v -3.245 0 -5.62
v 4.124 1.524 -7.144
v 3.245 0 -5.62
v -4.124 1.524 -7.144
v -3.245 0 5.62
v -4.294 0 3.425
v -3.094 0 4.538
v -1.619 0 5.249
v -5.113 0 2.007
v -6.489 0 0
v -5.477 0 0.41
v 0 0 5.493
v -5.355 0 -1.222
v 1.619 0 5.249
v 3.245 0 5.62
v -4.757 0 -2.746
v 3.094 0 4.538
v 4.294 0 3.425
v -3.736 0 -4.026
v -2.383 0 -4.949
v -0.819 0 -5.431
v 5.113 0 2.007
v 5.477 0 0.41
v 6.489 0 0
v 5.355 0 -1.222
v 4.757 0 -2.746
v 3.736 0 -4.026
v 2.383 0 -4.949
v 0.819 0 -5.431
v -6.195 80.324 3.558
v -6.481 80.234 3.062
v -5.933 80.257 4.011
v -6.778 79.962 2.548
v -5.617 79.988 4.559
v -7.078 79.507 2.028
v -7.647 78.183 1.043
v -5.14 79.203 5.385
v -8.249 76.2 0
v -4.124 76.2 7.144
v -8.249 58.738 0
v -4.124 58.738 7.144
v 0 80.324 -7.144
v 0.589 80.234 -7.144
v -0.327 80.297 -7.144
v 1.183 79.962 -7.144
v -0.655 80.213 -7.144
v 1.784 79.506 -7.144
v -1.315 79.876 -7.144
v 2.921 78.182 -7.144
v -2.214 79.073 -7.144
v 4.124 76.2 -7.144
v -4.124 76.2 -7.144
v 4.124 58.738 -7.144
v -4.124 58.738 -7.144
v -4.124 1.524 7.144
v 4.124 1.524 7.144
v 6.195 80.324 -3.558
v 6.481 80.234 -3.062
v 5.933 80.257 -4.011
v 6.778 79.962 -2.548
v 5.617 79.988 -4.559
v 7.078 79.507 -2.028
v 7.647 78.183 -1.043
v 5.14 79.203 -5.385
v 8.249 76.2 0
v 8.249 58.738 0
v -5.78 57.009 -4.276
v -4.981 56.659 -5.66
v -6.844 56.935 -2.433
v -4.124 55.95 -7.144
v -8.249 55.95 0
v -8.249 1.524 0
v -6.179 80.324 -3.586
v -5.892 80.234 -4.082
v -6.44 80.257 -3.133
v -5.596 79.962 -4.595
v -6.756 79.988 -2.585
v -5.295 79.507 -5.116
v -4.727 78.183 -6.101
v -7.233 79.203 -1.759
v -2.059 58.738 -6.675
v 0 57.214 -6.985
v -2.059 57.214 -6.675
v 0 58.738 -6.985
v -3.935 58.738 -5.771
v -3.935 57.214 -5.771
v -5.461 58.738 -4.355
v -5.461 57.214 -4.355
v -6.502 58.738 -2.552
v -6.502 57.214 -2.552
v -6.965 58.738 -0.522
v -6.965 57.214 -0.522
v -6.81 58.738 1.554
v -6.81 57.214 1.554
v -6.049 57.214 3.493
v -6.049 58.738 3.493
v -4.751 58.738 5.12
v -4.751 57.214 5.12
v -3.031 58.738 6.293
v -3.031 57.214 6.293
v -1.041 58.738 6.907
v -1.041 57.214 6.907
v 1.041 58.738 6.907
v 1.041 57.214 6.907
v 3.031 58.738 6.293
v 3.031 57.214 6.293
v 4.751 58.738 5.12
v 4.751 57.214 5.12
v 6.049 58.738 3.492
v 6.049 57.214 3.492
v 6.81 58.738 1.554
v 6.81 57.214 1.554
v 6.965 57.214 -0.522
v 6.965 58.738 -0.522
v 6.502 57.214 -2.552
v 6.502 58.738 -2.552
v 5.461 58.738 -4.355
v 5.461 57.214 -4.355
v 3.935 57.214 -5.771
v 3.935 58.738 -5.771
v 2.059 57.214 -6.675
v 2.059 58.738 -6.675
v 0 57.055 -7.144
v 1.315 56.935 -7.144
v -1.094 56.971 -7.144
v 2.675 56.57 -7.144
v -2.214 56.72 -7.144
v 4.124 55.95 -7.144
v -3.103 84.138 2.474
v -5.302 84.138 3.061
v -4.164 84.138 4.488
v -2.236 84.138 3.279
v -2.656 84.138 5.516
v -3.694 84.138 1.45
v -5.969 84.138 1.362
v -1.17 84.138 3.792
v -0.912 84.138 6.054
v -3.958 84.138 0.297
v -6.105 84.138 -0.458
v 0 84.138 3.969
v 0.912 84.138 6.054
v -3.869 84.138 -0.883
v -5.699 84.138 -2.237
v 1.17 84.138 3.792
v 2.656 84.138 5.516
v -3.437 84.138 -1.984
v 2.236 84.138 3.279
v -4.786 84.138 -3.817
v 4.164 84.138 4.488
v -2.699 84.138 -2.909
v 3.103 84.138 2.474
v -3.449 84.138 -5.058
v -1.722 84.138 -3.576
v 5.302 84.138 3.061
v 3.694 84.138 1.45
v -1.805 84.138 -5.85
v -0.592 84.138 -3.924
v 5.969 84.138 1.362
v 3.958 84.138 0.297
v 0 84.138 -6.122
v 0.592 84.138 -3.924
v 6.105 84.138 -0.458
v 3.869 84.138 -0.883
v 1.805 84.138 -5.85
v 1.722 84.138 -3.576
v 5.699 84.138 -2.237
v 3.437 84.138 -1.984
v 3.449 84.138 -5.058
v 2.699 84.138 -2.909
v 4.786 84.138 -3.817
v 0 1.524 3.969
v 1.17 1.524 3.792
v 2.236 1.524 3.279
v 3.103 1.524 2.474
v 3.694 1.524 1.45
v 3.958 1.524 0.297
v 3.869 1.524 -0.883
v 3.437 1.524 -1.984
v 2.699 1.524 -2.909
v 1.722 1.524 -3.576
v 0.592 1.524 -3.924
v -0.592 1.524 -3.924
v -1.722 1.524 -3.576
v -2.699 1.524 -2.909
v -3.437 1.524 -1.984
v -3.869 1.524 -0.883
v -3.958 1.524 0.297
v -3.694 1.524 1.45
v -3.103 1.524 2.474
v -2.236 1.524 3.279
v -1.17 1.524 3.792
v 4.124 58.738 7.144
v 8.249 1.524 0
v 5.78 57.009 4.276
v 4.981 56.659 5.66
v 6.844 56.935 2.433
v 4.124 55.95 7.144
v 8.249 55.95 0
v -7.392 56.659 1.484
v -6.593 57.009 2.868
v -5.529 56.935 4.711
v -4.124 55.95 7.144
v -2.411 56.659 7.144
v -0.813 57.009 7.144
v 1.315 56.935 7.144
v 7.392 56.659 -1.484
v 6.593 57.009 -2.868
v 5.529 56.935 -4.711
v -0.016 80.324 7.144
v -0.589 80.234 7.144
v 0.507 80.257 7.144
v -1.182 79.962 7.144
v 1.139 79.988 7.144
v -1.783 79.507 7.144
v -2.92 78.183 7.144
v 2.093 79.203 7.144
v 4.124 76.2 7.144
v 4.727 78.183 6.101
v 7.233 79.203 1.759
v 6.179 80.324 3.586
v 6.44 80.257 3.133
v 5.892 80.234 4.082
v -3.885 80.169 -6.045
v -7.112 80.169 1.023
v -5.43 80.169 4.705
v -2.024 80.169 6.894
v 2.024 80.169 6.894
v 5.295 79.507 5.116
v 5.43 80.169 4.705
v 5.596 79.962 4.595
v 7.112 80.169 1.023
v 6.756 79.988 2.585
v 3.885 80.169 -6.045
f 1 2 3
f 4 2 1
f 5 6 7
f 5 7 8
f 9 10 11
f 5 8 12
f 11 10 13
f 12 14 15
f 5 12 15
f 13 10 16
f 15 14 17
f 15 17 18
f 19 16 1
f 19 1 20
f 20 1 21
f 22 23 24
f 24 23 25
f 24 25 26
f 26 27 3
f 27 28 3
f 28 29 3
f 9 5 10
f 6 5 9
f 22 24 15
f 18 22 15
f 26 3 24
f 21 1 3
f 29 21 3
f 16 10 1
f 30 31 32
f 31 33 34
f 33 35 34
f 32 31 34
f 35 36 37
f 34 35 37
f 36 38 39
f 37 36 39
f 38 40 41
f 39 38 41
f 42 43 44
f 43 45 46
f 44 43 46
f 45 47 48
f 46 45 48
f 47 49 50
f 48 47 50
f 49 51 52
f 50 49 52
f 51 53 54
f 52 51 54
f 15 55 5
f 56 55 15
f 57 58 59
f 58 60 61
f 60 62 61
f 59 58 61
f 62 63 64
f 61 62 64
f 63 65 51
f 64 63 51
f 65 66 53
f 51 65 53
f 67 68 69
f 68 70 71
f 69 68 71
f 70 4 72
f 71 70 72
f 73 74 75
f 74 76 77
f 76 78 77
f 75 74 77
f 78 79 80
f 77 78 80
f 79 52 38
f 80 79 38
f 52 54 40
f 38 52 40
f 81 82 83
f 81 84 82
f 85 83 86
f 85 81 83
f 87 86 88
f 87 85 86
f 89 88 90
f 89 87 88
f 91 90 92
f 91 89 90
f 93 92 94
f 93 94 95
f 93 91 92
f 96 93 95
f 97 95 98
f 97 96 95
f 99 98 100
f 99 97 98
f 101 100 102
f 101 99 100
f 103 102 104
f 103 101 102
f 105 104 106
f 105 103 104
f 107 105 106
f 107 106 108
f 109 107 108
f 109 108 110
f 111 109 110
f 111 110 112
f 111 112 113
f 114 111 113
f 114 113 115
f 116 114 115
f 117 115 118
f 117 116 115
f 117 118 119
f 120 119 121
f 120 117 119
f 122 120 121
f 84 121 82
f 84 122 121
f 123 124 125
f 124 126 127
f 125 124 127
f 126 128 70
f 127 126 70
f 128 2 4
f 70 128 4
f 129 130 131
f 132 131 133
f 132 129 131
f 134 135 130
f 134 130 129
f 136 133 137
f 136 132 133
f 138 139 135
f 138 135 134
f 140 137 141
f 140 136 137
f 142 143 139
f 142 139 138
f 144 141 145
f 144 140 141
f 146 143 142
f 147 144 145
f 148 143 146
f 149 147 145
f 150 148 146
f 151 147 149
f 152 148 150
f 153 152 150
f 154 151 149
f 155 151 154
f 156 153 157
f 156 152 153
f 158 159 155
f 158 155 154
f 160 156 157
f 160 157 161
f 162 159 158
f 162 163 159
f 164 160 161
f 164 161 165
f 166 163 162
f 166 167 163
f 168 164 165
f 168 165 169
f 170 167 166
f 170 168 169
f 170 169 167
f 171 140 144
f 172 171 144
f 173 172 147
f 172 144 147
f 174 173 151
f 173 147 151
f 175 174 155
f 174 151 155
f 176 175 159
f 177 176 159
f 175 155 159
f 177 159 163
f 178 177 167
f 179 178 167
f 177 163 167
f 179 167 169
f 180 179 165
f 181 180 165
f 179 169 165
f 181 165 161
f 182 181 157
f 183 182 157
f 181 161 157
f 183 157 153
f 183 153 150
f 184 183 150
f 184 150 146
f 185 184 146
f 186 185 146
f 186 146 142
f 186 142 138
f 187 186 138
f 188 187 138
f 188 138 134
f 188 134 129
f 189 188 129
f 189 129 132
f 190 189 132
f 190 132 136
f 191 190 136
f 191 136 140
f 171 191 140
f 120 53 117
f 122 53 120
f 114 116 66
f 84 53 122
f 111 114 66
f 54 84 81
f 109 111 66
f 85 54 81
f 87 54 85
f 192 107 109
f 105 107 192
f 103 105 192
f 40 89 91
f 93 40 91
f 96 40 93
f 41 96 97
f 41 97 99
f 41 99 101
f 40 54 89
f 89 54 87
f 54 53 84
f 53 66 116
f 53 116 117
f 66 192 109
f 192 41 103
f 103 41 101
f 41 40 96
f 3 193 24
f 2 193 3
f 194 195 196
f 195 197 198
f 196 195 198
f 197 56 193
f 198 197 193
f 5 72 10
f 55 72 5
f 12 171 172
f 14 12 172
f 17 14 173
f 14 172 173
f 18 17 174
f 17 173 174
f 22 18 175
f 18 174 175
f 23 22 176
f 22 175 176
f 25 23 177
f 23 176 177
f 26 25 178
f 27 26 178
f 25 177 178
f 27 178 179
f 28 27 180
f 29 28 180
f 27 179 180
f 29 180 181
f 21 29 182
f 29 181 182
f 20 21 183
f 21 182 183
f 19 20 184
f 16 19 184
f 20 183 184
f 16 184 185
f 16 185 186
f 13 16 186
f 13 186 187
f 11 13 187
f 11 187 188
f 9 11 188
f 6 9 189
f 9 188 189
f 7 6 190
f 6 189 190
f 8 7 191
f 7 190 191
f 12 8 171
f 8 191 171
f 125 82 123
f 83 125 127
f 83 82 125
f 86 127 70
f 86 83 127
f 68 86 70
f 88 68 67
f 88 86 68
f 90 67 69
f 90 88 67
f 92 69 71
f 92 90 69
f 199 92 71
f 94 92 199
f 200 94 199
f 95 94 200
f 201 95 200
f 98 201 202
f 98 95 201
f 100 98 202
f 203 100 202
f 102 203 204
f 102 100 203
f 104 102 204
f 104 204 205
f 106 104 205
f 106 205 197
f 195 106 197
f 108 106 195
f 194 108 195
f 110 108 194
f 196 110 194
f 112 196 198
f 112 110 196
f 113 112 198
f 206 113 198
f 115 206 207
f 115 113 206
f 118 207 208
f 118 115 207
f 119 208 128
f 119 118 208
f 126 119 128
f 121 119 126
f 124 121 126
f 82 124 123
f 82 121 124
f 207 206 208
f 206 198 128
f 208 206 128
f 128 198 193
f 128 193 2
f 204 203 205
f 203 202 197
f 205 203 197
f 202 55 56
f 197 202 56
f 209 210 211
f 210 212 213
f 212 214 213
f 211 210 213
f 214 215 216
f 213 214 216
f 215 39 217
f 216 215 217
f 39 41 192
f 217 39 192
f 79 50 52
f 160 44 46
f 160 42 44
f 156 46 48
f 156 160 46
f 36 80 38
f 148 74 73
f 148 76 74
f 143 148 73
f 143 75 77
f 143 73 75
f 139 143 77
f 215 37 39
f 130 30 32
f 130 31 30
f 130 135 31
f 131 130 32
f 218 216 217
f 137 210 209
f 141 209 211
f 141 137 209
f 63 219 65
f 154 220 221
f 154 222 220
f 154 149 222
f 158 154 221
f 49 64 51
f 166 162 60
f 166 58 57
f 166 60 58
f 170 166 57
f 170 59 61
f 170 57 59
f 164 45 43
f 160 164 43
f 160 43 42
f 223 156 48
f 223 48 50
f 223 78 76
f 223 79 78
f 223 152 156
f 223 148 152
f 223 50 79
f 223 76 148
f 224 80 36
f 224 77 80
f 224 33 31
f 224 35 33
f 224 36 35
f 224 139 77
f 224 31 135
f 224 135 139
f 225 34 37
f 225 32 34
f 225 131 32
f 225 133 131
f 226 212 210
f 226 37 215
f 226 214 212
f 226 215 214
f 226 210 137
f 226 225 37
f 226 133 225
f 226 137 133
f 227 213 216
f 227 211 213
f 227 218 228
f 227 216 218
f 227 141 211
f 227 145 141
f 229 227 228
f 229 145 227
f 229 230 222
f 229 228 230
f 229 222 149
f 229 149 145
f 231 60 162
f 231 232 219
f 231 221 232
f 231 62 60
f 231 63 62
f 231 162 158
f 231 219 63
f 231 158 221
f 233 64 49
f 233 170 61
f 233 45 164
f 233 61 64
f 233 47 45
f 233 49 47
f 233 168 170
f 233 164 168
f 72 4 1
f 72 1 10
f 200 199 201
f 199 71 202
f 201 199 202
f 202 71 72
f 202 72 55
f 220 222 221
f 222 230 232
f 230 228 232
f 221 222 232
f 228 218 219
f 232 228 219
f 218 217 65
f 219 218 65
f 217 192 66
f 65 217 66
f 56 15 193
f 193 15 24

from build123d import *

# Parameters (mm, degrees)
EXTRUDE1_DEPTH     = 84.1375
SKETCH4_R          = 3.96875
CUT_EXTRUDE1_DEPTH = 85.842184608
CHAMFER1_SIZE      = 1.524


with BuildPart() as part:
    # Sketch1 → Extrude1 (new body)
    with BuildSketch(Plane(origin=(0, 0, 0), x_dir=(1, 0, 0), z_dir=(0, 1, 0))):
        Polygon((4.124445986, -7.14375), (8.248891971, 0), (4.124445986, 7.14375), (-4.124445986, 7.14375), (-8.248891971, 0), (-4.124445986, -7.14375), align=None)
    extrude(amount=EXTRUDE1_DEPTH)

    # Sketch4 → Cut-Extrude1 (cut, through all)
    with BuildSketch(Plane(origin=(0, 84.1375, 0), x_dir=(-1, 0, 0), z_dir=(0, 1, 0))):
        with Locations(Location((0, 0, 0), (0, 0, 90))):
            Circle(SKETCH4_R)
    extrude(amount=-CUT_EXTRUDE1_DEPTH, mode=Mode.SUBTRACT)

    # Sketch2 → Cut-Revolve1 (revolve, cut)
    with BuildSketch(Plane(origin=(0, 0, 0), x_dir=(-0.500000000000001, 0, -0.866025403784438), z_dir=(0.866025403784438, 0, -0.500000000000001)), mode=Mode.PRIVATE) as cut_revolve1_sk:
        Polygon((8.248891971, 84.1375), (8.248891971, 76.2), (6.122045256, 84.1375), align=None)
    revolve(cut_revolve1_sk.sketch.rotate(Axis((0, -6.288333001, 0), (0, 1, 0)), 330), axis=Axis((0, -6.288333001, 0), (0, 1, 0)), mode=Mode.SUBTRACT)

    # Sketch3 → Cut-Revolve2 (revolve, cut)
    with BuildSketch(Plane(origin=(0, 0, 0), x_dir=(-0.500000000000001, 0, -0.866025403784438), z_dir=(0.866025403784438, 0, -0.500000000000001)), mode=Mode.PRIVATE) as cut_revolve2_sk:
        Polygon((8.248891971, 55.949608029), (6.985, 57.2135), (6.985, 58.7375), (8.248891971, 58.7375), align=None)
    revolve(cut_revolve2_sk.sketch.rotate(Axis((0, -5.572817584, 0), (0, 1, 0)), 330), axis=Axis((0, -5.572817584, 0), (0, 1, 0)), mode=Mode.SUBTRACT)

    # Chamfer1
    chamfer1_edges = [part.edges().sort_by_distance(p)[0] for p in [
        (0, 0, -3.96875),
        (-6.186668978, 0, 3.571875),
        (-6.186668978, 0, -3.571875),
        (0, 0, -7.14375),
        (6.186668978, 0, -3.571875),
        (6.186668978, 0, 3.571875),
        (0, 0, 7.14375),
    ]]
    chamfer(chamfer1_edges, length=CHAMFER1_SIZE)


solid = part.part
